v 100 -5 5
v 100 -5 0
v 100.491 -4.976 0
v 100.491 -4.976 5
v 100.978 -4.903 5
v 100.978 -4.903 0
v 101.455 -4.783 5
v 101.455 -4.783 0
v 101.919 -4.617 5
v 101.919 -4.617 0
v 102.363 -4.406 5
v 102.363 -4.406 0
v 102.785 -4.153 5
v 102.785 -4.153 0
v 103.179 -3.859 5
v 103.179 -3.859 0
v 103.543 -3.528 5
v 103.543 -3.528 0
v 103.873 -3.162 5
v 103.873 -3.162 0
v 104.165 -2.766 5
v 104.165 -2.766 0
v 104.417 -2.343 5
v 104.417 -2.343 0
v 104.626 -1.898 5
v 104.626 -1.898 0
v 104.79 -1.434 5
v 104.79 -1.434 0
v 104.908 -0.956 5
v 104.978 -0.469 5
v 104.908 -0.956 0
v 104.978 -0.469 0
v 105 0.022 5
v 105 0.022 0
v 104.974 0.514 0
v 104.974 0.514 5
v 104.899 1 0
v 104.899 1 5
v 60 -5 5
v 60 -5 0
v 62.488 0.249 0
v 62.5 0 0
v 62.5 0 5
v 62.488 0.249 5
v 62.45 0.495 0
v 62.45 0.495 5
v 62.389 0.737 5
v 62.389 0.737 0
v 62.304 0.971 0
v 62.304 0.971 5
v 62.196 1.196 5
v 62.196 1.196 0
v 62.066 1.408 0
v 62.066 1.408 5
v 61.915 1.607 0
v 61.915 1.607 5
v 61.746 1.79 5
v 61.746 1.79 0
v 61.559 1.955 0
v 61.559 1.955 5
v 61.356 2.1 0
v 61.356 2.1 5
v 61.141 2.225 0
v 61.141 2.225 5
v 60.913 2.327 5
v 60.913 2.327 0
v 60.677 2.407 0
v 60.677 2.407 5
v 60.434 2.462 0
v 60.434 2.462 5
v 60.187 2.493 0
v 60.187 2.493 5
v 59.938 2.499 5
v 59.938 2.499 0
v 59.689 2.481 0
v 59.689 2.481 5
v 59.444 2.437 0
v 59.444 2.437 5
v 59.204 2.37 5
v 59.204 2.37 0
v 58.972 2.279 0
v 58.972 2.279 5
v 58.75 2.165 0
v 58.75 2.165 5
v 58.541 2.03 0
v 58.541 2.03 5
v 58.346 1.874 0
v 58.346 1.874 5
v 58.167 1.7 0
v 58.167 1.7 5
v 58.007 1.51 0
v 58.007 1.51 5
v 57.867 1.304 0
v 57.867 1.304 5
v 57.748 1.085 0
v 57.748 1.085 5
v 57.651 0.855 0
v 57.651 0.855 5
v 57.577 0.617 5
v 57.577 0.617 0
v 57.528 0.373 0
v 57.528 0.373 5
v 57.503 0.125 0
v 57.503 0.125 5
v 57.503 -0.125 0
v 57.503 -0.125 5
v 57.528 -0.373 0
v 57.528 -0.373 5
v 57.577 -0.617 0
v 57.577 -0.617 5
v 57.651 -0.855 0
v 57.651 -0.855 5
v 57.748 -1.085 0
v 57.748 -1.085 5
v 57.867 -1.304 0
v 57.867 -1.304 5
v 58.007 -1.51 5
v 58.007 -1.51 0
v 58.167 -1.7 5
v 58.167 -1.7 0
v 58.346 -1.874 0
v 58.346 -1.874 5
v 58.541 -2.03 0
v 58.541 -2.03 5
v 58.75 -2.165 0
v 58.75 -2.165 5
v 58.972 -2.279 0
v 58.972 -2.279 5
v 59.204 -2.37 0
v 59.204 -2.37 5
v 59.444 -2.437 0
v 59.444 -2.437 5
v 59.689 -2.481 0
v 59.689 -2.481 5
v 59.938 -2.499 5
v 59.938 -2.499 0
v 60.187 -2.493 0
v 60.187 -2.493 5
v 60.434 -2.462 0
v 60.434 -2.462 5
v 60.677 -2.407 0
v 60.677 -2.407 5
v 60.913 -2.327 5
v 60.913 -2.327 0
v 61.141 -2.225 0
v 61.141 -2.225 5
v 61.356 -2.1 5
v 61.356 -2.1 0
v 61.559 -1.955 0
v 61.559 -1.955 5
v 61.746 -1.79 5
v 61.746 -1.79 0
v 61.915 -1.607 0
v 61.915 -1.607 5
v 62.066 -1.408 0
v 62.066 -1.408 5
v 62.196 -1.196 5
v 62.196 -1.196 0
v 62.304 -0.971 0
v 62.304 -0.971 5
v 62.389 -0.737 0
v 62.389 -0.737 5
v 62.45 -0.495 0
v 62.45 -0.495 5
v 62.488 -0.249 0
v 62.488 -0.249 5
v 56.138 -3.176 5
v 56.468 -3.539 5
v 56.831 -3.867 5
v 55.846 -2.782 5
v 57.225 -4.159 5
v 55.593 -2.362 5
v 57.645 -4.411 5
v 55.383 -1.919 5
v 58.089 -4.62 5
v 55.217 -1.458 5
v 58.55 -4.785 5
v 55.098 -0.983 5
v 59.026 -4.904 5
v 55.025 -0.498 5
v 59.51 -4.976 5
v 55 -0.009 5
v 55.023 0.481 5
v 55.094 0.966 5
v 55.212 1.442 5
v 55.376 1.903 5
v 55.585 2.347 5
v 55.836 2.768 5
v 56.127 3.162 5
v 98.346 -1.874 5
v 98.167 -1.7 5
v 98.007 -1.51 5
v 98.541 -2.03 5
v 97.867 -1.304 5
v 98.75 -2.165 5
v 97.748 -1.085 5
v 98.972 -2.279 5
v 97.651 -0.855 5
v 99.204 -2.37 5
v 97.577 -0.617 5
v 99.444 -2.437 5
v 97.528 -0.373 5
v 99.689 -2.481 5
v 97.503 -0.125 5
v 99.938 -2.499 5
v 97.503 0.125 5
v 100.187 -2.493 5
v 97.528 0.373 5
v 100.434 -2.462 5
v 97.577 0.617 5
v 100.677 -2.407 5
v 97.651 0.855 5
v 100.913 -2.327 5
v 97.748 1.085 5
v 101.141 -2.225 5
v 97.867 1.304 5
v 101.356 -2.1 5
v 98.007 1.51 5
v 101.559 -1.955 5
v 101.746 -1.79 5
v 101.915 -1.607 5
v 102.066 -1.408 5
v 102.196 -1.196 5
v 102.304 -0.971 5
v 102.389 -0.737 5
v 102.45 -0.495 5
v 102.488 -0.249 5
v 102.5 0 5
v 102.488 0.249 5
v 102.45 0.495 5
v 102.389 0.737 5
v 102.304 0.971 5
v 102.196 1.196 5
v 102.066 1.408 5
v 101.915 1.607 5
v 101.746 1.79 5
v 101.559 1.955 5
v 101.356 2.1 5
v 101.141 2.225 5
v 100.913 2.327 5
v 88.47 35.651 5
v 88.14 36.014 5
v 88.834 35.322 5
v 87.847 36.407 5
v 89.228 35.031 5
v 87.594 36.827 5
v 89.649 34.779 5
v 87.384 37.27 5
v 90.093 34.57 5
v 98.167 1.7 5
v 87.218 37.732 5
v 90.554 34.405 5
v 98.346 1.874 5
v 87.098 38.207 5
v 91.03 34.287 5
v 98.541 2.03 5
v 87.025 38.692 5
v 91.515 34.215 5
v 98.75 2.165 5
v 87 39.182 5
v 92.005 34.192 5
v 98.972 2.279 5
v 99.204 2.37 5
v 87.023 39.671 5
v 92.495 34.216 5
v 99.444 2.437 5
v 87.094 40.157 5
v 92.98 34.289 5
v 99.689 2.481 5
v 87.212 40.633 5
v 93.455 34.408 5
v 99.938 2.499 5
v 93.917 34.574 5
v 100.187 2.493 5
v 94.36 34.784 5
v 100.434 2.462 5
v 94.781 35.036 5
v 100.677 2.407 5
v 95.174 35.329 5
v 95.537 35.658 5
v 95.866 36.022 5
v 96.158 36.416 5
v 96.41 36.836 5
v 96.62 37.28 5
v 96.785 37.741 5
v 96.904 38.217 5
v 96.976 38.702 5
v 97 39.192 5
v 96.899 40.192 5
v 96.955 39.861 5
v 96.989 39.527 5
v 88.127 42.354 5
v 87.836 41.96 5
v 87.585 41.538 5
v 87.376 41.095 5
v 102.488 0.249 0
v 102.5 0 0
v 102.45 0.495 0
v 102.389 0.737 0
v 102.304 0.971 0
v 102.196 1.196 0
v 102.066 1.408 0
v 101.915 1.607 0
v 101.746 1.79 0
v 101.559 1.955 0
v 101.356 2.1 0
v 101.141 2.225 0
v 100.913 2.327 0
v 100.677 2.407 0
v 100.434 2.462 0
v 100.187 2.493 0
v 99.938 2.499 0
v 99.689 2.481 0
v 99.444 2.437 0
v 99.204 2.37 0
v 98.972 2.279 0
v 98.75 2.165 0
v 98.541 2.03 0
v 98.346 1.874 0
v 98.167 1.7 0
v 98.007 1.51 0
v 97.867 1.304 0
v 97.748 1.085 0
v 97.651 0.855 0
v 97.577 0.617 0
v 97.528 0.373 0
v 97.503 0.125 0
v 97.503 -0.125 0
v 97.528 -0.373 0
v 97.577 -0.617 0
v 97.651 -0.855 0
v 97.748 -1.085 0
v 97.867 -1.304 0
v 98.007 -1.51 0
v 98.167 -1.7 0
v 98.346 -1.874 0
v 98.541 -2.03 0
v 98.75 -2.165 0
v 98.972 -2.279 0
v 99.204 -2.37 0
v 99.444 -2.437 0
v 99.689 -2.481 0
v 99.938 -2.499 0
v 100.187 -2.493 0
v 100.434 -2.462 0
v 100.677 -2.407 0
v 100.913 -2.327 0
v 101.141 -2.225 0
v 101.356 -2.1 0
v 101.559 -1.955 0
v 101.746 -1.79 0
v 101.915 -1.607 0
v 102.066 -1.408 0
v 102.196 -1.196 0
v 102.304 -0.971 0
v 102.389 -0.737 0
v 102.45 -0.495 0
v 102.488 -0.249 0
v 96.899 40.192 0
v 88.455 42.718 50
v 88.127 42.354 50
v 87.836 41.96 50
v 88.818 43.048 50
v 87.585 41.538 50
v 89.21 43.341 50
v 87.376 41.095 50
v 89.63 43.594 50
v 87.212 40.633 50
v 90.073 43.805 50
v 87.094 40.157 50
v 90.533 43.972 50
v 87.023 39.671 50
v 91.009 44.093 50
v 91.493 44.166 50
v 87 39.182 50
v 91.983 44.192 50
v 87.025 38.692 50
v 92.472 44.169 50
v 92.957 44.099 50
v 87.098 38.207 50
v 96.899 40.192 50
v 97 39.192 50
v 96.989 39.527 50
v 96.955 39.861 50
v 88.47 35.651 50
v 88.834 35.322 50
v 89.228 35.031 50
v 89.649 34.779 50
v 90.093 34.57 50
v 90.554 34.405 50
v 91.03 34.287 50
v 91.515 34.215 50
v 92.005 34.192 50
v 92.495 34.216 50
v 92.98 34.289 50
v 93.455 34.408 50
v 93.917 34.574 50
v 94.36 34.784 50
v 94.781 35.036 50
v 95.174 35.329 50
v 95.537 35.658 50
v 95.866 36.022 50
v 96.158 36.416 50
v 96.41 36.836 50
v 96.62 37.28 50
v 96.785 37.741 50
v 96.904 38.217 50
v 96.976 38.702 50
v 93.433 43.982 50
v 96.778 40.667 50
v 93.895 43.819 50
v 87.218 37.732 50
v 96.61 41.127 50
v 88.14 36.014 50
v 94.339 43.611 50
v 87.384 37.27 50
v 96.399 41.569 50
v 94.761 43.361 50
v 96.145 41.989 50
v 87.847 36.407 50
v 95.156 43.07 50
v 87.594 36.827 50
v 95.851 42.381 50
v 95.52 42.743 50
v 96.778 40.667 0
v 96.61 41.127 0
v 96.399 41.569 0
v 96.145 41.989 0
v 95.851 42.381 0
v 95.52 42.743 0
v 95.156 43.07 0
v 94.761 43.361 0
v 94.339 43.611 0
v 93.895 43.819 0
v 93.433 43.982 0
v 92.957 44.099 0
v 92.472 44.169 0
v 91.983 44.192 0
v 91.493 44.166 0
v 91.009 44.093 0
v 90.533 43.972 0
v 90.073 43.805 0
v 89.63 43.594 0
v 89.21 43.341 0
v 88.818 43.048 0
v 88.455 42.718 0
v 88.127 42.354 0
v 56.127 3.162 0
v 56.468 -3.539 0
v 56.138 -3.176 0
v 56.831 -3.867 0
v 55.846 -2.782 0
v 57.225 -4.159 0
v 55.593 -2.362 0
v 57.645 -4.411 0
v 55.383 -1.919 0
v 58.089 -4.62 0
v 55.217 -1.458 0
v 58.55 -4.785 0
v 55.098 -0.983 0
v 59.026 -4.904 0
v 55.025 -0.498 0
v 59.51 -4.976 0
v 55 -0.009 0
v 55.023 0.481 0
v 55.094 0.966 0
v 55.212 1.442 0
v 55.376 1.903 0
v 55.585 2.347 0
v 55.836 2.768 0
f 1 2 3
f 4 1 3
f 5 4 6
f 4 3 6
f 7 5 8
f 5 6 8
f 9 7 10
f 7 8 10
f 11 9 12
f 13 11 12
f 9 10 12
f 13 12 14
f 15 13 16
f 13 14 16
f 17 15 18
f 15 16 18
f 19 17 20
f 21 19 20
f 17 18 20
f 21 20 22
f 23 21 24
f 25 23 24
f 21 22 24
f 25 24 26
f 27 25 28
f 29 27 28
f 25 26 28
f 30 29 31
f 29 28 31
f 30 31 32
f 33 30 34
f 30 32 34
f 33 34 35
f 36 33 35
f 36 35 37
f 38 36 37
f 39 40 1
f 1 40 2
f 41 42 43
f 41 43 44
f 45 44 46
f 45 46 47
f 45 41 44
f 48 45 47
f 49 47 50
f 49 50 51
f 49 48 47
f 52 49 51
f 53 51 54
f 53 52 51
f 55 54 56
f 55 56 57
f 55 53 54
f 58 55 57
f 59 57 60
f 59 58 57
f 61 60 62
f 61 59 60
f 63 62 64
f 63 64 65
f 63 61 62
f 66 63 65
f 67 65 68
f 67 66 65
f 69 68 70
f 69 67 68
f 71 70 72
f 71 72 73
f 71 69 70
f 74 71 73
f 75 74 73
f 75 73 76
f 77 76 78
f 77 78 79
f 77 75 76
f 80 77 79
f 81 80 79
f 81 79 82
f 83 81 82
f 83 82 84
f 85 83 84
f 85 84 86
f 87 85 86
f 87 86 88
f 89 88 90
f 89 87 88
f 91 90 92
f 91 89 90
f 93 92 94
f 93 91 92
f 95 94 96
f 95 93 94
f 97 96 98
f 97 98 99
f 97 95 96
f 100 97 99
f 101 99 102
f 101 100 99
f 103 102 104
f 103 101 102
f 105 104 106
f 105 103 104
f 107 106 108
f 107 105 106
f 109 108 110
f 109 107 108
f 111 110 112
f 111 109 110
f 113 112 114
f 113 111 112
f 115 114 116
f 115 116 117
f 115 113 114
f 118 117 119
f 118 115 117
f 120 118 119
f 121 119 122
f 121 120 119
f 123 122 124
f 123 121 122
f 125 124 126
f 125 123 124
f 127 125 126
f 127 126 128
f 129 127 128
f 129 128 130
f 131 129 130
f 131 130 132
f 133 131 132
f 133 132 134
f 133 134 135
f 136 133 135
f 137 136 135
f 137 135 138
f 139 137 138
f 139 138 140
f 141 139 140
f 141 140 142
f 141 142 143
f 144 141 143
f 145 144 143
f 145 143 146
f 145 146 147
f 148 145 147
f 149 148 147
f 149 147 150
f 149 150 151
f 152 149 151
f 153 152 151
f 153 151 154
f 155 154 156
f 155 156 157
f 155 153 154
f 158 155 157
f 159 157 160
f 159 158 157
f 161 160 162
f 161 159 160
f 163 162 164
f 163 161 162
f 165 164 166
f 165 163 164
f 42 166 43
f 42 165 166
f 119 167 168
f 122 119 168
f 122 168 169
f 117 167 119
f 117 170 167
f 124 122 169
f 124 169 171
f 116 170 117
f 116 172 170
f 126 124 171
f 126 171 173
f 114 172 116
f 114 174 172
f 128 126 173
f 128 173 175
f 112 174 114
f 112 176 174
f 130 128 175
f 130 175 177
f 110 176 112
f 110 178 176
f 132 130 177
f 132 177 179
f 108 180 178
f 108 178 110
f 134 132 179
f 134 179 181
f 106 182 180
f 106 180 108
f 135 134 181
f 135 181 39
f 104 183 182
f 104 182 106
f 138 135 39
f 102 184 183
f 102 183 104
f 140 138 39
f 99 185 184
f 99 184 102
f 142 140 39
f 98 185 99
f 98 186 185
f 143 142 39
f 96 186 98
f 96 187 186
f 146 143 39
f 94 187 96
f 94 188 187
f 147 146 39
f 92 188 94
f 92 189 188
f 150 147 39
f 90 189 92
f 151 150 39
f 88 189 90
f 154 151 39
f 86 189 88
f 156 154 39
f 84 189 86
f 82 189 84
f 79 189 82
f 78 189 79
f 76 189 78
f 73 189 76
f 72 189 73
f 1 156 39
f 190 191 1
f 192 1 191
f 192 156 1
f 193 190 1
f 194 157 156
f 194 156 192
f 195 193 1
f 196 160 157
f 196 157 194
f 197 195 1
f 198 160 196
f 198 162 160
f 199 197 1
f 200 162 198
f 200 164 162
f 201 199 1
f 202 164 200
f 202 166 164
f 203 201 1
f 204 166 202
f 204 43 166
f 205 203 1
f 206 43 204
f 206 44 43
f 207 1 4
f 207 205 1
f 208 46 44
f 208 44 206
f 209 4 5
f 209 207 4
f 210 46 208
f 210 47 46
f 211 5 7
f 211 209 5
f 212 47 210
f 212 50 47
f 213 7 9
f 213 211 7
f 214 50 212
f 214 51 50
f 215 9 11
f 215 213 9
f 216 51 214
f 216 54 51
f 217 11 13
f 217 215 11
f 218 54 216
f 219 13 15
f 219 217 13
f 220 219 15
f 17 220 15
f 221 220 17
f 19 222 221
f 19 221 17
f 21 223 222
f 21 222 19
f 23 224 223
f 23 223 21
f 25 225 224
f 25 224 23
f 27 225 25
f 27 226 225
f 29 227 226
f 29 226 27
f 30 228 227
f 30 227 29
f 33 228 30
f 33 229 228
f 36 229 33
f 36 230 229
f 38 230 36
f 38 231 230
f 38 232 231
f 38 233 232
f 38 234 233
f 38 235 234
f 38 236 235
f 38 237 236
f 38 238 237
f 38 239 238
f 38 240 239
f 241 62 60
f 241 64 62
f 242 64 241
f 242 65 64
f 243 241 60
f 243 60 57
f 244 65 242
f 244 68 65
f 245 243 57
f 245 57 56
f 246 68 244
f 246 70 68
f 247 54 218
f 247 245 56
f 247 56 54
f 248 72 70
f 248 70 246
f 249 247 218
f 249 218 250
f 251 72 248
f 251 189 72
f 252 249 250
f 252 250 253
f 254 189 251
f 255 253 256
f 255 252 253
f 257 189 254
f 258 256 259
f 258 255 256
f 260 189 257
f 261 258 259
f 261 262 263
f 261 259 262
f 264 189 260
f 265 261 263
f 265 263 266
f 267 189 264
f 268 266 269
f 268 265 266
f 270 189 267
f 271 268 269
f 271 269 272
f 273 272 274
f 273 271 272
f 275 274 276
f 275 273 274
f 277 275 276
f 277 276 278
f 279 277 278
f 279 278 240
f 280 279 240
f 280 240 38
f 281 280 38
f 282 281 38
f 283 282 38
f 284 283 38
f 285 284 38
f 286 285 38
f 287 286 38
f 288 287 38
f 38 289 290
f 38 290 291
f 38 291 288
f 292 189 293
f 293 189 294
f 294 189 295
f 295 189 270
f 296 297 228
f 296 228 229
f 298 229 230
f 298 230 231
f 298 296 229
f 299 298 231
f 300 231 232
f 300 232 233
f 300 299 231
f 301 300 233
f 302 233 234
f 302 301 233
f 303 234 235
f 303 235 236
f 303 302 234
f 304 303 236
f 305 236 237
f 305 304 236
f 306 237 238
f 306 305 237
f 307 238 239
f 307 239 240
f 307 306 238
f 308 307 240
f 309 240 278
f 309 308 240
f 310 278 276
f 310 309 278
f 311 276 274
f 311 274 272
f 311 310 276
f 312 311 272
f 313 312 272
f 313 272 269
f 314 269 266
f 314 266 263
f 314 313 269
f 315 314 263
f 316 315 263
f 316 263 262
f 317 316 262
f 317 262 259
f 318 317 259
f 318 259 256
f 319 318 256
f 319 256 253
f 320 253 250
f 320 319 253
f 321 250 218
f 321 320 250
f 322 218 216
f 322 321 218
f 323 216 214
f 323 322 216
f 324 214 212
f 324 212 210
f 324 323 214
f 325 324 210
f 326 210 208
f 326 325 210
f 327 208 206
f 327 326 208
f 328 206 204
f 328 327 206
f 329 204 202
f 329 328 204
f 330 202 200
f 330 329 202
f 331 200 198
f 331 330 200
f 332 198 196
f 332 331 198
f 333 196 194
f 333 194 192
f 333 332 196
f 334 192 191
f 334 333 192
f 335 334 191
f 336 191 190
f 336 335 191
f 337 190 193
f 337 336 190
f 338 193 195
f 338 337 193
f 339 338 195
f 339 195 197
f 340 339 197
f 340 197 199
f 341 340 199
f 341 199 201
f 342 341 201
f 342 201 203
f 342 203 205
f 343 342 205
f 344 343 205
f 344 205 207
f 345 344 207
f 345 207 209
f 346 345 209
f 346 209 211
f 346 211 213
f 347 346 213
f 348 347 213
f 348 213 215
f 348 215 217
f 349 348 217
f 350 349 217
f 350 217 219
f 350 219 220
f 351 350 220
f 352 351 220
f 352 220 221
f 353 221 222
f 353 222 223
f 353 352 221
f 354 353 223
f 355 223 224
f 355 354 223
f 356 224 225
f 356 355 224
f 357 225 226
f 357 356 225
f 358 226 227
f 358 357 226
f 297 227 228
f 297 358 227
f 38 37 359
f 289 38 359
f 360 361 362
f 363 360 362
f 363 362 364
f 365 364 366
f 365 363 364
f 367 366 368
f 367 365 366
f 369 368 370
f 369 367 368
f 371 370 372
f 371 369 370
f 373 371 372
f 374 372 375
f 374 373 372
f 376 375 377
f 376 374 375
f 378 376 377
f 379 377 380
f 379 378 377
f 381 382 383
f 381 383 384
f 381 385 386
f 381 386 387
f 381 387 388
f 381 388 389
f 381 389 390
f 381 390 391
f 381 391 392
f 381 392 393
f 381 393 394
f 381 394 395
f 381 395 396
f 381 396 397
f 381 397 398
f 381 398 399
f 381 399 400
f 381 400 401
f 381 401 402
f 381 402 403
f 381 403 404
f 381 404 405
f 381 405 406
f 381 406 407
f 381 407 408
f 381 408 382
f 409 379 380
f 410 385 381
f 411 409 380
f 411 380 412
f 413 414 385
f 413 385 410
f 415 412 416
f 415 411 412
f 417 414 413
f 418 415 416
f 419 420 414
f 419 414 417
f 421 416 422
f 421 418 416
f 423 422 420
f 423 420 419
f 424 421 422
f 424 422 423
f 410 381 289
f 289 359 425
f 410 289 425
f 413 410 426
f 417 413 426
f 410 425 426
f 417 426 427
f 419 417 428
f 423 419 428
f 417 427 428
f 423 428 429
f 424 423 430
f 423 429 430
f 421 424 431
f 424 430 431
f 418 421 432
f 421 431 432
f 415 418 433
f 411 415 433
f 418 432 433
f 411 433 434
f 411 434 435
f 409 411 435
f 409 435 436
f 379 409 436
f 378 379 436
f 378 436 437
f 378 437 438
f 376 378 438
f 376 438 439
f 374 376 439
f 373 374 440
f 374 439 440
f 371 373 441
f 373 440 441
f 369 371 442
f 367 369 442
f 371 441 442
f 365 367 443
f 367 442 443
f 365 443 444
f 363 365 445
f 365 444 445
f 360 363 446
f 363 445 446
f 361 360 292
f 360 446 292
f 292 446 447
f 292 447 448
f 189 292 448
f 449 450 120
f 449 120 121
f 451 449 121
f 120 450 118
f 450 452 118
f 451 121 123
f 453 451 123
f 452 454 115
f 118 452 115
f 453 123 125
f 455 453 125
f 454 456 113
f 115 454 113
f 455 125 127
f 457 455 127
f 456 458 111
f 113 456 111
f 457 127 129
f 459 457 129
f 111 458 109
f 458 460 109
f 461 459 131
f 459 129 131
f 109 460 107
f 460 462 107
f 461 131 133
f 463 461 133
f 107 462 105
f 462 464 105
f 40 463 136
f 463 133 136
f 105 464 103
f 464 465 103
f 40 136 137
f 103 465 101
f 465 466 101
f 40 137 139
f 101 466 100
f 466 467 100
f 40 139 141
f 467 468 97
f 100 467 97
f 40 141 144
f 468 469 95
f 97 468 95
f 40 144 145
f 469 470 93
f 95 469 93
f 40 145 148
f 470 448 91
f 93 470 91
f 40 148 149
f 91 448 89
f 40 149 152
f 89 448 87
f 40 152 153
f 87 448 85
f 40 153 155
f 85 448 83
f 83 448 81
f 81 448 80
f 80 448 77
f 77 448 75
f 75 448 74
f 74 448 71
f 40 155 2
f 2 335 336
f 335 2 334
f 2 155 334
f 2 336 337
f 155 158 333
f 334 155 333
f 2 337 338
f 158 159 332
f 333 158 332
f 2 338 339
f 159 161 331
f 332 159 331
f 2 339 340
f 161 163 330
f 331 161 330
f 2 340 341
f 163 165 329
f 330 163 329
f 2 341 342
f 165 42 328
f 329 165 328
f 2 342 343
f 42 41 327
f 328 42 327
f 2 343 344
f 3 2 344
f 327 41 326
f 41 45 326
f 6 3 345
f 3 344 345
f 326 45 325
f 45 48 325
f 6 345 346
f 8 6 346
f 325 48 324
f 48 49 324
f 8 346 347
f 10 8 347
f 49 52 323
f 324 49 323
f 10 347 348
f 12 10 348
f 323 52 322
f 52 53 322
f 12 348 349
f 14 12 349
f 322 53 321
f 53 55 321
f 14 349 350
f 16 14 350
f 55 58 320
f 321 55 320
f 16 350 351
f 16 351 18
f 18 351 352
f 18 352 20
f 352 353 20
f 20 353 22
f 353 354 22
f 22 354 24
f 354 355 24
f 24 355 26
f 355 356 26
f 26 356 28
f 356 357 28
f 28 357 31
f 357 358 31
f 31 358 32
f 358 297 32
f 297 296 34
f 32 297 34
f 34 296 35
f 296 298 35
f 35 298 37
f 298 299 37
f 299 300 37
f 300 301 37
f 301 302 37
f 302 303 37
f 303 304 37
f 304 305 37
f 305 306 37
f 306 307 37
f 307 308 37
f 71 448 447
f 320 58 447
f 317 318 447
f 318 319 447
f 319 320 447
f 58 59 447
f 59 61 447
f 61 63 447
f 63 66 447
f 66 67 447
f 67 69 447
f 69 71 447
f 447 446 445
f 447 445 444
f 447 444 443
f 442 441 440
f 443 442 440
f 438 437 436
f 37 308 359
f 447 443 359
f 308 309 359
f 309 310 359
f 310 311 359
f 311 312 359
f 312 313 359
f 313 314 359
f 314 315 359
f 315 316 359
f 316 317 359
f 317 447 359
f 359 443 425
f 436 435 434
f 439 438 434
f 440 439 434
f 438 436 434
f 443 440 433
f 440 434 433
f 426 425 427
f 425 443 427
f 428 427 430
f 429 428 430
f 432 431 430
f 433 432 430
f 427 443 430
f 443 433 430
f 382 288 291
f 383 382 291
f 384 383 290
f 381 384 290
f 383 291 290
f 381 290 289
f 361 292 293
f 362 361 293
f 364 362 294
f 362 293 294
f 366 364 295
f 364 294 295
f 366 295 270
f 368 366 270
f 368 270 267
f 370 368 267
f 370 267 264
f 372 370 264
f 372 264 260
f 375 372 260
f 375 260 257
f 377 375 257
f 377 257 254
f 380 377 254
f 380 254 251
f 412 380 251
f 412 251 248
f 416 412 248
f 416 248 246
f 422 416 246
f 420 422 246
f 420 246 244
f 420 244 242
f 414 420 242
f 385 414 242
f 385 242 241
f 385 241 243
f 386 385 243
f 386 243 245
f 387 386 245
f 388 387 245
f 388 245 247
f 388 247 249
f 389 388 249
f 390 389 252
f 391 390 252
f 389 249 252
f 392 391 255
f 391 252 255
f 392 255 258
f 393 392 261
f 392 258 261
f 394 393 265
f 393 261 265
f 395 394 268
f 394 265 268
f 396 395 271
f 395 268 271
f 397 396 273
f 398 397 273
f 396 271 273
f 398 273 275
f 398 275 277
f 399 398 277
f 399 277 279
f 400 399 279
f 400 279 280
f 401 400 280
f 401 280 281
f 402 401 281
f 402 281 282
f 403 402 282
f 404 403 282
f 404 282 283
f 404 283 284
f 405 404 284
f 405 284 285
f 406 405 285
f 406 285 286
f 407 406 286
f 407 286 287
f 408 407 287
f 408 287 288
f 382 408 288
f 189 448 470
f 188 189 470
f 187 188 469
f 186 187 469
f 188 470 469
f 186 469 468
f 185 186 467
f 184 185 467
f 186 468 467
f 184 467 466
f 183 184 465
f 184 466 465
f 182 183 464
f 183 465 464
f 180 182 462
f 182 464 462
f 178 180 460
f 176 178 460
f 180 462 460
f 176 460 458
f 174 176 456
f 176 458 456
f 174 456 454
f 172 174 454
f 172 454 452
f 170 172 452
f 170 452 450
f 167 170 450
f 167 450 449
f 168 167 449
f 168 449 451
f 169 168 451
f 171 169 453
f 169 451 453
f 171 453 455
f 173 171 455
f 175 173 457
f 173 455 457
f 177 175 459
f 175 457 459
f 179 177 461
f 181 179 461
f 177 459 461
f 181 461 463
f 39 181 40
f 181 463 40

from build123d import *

# Parameters (mm, degrees)
F0_R     = 2.5
F1_DEPTH = 5
F2_DEPTH = 50


with BuildPart() as f1:
    # F0 (on Top) → F1 (new body)
    with BuildSketch(Plane.XY):
        with BuildLine():
            Line((60, -5), (100, -5))
            ThreePointArc((100, -5), (103.872983, -3.162278), (104.898979, 1))
            Line((104.898979, 1), (96.898979, 40.191836))
            ThreePointArc((96.898979, 40.191836), (96.974681, 39.694381), (97, 39.191836))
            ThreePointArc((97, 39.191836), (90.321447, 34.48201), (88.127017, 42.354114))
            Line((88.127017, 42.354114), (56.127017, 3.162278))
            ThreePointArc((56.127017, 3.162278), (55.482734, -2.143433), (60, -5))
        make_face()
        with Locations((60, 0)):
            Circle(F0_R, mode=Mode.SUBTRACT)
        with Locations((100, 0)):
            Circle(F0_R, mode=Mode.SUBTRACT)
    extrude(amount=F1_DEPTH)

    # F0 (on Top) → F2 (join)
    with BuildSketch(Plane.XY):
        with BuildLine():
            ThreePointArc((97, 39.191836), (96.974681, 39.694381), (96.898979, 40.191836))
            ThreePointArc((96.898979, 40.191836), (93.196674, 44.046521), (88.127017, 42.354114))
            ThreePointArc((88.127017, 42.354114), (90.321447, 34.48201), (97, 39.191836))
        make_face()
    extrude(amount=F2_DEPTH)


solid = f1.part
